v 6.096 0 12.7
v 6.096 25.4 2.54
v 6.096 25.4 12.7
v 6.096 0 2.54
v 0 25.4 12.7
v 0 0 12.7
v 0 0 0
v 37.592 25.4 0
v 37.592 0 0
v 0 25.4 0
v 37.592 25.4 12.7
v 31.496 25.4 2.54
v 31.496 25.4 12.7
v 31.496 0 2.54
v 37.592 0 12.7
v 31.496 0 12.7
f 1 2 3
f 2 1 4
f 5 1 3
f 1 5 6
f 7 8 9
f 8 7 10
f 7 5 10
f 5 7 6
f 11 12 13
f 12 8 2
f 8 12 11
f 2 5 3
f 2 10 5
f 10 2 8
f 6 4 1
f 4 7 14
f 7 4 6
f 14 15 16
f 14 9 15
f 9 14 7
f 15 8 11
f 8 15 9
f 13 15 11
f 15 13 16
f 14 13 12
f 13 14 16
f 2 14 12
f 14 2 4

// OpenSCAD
union() {
	scale(v = 25.4000000000) {
		union() {
			cube(size = [1.4800000000, 1, 0.1000000000]);
			union() {
				cube(size = [0.2400000000, 1, 0.5000000000]);
				translate(v = [1.2400000000, 0, 0]) {
					cube(size = [0.2400000000, 1, 0.5000000000]);
				}
			}
		}
	}
}
